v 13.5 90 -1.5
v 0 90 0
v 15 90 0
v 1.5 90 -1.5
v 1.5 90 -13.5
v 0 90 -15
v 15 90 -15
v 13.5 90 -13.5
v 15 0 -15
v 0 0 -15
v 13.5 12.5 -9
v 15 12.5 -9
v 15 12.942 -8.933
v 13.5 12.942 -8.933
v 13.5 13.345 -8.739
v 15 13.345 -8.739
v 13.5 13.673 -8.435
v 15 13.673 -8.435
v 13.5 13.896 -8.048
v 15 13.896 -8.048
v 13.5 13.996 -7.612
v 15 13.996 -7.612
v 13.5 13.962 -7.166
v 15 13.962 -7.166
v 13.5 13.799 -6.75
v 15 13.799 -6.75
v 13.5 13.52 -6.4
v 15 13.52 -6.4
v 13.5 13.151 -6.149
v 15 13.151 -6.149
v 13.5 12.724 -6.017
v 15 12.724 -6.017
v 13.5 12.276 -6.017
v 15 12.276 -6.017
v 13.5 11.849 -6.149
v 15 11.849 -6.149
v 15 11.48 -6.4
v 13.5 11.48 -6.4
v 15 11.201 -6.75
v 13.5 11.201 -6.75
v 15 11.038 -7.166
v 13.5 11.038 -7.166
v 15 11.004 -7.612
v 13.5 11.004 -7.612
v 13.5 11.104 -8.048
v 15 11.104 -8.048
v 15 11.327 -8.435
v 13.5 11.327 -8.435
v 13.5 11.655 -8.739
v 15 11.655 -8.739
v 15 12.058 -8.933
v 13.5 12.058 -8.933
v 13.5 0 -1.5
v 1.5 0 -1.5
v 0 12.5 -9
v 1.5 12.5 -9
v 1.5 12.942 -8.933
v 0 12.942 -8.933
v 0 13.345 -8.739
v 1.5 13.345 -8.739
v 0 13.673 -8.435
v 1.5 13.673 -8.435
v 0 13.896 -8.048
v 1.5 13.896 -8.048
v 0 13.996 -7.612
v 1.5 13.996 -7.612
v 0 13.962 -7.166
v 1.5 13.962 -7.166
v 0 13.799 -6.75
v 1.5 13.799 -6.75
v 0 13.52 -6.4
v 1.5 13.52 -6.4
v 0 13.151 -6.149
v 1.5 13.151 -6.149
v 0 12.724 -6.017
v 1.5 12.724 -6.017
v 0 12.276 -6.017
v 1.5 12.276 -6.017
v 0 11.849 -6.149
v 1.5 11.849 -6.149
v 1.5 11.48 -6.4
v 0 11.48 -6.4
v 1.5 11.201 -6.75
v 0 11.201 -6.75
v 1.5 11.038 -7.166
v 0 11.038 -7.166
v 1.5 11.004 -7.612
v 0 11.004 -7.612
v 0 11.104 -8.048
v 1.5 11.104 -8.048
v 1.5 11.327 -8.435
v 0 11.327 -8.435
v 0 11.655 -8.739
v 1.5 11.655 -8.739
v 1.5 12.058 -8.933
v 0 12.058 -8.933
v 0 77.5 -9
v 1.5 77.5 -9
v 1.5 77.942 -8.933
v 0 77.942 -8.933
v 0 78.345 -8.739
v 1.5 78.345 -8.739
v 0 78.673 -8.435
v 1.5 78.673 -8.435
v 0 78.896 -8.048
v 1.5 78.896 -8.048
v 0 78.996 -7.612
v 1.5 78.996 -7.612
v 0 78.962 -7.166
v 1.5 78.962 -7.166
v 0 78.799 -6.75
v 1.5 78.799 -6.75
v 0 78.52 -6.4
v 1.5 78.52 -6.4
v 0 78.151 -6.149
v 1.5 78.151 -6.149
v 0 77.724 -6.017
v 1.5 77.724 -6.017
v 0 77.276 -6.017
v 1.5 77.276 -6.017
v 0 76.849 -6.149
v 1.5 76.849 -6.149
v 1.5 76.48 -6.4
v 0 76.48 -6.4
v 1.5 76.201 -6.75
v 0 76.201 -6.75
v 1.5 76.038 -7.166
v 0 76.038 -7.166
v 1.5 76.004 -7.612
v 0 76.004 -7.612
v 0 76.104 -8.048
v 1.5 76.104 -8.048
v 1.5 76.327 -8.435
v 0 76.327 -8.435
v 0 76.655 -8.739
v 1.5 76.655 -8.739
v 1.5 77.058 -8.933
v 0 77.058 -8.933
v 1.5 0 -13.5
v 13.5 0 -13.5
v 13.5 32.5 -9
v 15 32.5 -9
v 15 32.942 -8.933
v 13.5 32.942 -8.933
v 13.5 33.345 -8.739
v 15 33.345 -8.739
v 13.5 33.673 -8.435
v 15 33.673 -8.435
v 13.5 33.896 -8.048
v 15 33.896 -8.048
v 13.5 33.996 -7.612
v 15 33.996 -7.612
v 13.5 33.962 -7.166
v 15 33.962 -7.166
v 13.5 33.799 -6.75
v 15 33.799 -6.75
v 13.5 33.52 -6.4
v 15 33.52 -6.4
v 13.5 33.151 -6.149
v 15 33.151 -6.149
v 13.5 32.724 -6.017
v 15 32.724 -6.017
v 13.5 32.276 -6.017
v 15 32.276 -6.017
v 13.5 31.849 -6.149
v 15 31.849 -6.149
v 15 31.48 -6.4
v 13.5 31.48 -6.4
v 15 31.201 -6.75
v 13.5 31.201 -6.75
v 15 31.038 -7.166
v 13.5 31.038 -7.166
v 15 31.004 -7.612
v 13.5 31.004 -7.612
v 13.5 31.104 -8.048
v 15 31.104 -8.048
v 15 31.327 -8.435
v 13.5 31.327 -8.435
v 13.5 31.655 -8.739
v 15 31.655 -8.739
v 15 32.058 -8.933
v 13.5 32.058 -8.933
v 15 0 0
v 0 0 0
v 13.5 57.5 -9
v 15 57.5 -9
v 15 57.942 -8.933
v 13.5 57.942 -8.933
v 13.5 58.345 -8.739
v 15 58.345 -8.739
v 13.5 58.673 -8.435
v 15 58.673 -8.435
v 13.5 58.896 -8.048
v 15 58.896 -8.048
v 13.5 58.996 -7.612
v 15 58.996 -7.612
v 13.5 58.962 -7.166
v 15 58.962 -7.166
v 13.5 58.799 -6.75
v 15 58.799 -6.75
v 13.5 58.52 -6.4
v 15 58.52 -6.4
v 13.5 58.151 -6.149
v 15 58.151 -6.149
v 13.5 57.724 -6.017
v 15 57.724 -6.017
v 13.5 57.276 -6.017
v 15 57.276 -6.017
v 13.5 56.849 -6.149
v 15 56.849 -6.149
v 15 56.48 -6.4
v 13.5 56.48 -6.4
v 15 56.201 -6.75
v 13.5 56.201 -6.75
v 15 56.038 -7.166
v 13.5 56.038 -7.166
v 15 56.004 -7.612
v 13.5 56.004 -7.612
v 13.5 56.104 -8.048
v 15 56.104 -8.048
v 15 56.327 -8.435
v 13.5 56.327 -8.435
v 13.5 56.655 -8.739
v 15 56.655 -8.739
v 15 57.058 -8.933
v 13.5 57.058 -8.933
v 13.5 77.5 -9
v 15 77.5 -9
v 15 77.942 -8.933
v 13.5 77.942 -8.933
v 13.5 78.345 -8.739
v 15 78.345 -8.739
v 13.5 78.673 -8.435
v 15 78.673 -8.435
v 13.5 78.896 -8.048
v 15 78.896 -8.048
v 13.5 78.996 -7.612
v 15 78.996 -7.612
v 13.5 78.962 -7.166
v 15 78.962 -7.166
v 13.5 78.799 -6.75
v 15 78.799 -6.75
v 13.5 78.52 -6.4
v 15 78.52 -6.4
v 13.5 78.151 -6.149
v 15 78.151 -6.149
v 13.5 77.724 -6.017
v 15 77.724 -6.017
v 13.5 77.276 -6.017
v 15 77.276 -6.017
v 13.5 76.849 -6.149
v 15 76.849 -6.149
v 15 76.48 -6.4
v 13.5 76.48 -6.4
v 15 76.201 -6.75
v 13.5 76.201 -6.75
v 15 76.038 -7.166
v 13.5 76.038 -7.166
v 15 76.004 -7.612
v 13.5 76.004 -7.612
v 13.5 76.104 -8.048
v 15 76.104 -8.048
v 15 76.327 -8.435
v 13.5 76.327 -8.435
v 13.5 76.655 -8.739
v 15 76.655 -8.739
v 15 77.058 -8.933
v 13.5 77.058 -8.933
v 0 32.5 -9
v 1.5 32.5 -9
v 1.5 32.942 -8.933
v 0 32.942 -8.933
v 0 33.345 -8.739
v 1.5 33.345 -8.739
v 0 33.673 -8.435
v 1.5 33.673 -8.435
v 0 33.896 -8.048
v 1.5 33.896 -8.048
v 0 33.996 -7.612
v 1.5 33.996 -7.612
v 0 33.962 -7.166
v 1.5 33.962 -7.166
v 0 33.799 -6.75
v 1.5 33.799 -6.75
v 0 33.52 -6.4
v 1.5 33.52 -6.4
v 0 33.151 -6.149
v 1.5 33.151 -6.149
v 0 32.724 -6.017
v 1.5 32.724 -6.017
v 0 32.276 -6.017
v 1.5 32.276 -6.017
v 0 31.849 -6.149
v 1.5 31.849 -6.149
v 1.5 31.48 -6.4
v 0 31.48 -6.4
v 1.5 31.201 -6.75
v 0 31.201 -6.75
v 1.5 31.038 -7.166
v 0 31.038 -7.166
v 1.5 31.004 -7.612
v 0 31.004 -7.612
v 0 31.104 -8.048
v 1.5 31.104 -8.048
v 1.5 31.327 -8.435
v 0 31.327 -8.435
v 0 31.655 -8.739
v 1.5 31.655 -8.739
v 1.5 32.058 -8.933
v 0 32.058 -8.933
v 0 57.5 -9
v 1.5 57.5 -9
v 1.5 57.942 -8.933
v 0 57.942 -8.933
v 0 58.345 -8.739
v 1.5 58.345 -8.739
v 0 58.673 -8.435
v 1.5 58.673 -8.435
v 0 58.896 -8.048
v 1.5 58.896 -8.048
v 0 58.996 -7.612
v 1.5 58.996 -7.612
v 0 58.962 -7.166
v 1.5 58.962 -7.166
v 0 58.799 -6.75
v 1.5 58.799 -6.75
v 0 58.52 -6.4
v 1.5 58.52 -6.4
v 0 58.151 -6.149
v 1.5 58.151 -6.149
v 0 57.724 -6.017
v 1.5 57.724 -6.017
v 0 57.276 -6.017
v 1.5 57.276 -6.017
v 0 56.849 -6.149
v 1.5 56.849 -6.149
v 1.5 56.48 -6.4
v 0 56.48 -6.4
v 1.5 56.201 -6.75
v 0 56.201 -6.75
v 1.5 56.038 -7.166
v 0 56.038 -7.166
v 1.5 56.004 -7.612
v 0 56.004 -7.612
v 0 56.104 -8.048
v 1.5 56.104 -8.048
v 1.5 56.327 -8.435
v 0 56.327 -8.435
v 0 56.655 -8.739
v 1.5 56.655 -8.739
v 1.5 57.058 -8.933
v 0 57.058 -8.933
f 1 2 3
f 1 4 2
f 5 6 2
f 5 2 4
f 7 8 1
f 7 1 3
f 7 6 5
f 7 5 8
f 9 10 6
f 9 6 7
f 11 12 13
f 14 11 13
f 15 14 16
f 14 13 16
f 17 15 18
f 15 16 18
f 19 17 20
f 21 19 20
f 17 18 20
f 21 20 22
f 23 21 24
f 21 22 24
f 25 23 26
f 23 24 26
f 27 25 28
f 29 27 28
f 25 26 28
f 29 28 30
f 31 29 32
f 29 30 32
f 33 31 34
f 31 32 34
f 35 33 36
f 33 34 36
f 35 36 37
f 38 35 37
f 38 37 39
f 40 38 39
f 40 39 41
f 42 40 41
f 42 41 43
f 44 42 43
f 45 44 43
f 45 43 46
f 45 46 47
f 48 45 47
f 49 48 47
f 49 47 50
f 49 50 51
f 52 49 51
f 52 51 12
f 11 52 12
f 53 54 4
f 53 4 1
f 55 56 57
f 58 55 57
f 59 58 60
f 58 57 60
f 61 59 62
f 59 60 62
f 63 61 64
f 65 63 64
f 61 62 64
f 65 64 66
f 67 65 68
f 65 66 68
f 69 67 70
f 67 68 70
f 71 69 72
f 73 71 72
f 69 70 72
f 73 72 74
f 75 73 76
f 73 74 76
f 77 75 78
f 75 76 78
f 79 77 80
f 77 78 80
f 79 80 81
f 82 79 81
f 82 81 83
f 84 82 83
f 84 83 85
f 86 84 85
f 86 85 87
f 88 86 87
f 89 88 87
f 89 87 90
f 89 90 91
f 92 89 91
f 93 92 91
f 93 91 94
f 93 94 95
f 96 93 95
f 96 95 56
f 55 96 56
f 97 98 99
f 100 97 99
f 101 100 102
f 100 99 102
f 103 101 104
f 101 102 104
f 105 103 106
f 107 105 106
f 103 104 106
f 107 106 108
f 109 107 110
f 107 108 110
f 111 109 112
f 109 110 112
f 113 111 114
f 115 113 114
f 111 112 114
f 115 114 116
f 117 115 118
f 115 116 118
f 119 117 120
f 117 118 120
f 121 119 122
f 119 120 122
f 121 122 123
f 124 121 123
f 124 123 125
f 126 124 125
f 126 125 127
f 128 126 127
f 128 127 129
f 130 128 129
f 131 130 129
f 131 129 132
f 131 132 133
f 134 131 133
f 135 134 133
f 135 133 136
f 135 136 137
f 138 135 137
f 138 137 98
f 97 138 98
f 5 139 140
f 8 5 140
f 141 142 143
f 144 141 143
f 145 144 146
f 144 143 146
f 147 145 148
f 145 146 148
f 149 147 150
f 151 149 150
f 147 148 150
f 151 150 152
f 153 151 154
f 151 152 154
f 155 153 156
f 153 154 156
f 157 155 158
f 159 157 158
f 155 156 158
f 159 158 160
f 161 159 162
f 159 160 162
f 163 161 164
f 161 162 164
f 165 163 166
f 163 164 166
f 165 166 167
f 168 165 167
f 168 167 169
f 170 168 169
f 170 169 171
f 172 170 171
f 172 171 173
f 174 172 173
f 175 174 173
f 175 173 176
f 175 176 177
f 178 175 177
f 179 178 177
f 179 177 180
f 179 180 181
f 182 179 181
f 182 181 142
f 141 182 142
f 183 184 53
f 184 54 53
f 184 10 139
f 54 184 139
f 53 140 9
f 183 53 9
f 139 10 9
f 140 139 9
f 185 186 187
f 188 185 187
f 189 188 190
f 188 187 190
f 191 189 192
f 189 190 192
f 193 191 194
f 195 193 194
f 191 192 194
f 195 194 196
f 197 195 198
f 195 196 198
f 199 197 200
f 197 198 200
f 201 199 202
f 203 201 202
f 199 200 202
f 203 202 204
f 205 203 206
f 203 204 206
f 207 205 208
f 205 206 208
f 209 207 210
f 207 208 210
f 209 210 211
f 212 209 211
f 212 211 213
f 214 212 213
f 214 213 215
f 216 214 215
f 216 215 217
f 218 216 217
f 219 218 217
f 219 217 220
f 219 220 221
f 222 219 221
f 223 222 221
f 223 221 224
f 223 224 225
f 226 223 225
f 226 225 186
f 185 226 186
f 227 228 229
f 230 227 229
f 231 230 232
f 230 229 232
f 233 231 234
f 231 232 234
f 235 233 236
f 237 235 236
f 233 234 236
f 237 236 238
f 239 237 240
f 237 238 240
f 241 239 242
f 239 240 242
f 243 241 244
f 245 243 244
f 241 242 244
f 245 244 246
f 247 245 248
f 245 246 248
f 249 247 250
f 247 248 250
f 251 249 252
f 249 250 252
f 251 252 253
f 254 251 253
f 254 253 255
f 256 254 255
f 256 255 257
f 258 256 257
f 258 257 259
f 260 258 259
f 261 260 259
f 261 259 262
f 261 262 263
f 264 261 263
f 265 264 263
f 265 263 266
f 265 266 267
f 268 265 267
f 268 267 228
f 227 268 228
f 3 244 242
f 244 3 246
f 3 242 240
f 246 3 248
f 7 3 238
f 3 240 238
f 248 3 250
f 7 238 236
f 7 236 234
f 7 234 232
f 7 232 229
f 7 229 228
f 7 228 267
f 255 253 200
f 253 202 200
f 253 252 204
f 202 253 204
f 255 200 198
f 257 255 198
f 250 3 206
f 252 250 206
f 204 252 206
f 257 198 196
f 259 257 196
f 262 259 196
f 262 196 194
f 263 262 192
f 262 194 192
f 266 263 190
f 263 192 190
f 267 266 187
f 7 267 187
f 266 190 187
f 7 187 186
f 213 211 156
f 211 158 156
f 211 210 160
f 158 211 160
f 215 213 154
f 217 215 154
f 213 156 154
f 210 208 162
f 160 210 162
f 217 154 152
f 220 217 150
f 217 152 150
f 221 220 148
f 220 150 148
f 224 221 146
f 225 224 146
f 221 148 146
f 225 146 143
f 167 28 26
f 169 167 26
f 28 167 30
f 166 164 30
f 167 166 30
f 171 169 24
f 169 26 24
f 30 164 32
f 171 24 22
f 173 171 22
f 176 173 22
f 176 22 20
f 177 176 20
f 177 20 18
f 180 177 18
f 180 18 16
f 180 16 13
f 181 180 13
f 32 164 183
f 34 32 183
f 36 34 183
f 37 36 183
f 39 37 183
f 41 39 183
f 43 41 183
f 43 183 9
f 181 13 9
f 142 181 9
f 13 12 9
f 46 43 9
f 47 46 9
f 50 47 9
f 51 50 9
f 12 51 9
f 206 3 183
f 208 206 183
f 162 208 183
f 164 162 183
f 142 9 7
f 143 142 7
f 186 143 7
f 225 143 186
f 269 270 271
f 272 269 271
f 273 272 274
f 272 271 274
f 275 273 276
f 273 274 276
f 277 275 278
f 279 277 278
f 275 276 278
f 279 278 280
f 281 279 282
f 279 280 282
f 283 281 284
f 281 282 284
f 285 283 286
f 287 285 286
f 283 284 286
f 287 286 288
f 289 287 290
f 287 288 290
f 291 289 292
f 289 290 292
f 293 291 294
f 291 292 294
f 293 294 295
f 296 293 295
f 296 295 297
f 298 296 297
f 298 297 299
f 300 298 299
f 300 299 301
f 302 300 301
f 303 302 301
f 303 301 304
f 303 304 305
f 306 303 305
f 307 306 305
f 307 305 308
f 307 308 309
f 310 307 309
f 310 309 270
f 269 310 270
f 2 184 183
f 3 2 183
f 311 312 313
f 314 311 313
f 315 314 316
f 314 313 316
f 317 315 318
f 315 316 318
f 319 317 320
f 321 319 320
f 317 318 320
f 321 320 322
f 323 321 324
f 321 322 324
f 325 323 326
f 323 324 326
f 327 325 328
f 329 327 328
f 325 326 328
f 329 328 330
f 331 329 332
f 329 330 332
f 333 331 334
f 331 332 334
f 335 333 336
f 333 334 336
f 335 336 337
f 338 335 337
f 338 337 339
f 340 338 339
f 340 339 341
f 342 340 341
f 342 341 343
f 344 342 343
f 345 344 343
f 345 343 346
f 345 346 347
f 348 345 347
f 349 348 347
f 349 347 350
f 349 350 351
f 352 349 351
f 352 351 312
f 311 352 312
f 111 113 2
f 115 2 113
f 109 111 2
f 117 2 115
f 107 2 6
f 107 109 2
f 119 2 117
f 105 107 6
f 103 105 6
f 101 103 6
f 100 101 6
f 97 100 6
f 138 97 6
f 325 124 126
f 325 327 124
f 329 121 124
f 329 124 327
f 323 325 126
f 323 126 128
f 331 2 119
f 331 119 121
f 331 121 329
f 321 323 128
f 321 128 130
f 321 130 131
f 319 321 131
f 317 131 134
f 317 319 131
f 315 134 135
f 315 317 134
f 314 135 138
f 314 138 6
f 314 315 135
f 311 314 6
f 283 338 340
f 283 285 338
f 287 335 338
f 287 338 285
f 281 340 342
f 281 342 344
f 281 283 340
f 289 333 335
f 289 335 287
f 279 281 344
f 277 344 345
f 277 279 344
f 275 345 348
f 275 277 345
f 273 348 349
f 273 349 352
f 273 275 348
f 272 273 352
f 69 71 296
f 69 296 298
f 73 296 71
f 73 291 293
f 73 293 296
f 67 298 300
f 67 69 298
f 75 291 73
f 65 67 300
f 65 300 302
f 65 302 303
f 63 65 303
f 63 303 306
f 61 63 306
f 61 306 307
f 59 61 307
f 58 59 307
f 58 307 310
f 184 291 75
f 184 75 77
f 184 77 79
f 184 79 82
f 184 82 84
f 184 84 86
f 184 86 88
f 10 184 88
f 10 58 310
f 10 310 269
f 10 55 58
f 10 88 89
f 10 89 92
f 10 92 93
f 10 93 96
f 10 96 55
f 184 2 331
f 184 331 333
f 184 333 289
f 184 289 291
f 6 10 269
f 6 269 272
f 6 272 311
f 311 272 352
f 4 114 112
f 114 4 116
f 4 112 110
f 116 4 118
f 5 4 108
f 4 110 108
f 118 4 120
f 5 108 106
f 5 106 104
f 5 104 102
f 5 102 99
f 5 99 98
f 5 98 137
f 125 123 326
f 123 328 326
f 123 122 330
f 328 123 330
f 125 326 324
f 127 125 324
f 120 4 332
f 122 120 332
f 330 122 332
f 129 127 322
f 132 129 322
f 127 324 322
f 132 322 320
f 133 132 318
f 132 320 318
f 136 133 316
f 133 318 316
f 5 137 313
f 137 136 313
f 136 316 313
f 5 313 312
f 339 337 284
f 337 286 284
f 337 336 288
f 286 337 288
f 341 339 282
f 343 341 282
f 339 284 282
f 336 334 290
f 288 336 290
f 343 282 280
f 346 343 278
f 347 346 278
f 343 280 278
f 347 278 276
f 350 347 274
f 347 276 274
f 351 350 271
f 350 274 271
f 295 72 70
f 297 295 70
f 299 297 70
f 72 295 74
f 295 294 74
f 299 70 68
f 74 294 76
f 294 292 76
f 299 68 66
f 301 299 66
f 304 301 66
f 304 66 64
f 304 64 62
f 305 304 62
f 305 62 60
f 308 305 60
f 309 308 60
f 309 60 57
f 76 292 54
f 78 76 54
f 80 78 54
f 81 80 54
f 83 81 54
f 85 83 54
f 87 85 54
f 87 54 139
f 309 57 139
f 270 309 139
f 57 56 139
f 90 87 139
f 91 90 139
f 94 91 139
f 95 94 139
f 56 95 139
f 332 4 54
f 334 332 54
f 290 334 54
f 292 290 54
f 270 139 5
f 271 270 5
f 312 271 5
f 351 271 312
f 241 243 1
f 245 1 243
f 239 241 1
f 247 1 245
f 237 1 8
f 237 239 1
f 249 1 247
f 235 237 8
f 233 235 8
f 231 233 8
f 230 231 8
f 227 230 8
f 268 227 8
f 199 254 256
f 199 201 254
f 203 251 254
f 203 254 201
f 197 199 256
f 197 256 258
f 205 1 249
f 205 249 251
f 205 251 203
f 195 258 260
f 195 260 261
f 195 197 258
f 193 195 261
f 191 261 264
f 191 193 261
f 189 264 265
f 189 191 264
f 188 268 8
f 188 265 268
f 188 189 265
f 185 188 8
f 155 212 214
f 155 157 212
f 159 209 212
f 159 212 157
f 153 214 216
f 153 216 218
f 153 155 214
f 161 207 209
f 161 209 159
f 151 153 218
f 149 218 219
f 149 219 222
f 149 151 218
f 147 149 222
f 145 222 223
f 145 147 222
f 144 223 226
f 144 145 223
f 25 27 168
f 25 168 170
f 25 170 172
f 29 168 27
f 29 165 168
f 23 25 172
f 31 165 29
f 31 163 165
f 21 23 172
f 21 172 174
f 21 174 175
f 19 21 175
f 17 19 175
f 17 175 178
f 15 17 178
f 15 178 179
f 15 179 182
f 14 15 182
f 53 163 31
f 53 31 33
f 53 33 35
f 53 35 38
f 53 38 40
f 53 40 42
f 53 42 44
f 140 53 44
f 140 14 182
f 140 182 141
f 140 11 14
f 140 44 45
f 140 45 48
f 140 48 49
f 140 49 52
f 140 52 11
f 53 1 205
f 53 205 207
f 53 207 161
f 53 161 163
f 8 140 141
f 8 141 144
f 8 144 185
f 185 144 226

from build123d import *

# Parameters (mm, degrees)
SKETCH1_W           = 15
SKETCH1_H           = 15
SKETCH1_W_2         = 12
SKETCH1_H_2         = 12
EXTRUDE_THIN1_DEPTH = 90
SKETCH2_R           = 1.5
CUT_EXTRUDE1_DEPTH  = 16


with BuildPart() as part:
    # Sketch1 → Extrude-Thin1 (new body)
    with BuildSketch(Plane(origin=(0, 0, 0), x_dir=(1, 0, 0), z_dir=(0, 1, 0))):
        with Locations((7.5, 7.5)):
            Rectangle(SKETCH1_W, SKETCH1_H)
        with Locations((7.5, 7.5)):
            Rectangle(SKETCH1_W_2, SKETCH1_H_2, mode=Mode.SUBTRACT)
    extrude(amount=EXTRUDE_THIN1_DEPTH)

    # Sketch2 → Cut-Extrude1 (cut, through all)
    with BuildSketch(Plane(origin=(15, 0, 0), x_dir=(0, 0, -1), z_dir=(1, 0, 0))):
        with Locations((7.5, 12.5)):
            Circle(SKETCH2_R)
        with Locations((7.5, 32.5)):
            Circle(SKETCH2_R)
        with Locations((7.5, 57.5)):
            Circle(SKETCH2_R)
        with Locations((7.5, 77.5)):
            Circle(SKETCH2_R)
    extrude(amount=-CUT_EXTRUDE1_DEPTH, mode=Mode.SUBTRACT)


solid = part.part
